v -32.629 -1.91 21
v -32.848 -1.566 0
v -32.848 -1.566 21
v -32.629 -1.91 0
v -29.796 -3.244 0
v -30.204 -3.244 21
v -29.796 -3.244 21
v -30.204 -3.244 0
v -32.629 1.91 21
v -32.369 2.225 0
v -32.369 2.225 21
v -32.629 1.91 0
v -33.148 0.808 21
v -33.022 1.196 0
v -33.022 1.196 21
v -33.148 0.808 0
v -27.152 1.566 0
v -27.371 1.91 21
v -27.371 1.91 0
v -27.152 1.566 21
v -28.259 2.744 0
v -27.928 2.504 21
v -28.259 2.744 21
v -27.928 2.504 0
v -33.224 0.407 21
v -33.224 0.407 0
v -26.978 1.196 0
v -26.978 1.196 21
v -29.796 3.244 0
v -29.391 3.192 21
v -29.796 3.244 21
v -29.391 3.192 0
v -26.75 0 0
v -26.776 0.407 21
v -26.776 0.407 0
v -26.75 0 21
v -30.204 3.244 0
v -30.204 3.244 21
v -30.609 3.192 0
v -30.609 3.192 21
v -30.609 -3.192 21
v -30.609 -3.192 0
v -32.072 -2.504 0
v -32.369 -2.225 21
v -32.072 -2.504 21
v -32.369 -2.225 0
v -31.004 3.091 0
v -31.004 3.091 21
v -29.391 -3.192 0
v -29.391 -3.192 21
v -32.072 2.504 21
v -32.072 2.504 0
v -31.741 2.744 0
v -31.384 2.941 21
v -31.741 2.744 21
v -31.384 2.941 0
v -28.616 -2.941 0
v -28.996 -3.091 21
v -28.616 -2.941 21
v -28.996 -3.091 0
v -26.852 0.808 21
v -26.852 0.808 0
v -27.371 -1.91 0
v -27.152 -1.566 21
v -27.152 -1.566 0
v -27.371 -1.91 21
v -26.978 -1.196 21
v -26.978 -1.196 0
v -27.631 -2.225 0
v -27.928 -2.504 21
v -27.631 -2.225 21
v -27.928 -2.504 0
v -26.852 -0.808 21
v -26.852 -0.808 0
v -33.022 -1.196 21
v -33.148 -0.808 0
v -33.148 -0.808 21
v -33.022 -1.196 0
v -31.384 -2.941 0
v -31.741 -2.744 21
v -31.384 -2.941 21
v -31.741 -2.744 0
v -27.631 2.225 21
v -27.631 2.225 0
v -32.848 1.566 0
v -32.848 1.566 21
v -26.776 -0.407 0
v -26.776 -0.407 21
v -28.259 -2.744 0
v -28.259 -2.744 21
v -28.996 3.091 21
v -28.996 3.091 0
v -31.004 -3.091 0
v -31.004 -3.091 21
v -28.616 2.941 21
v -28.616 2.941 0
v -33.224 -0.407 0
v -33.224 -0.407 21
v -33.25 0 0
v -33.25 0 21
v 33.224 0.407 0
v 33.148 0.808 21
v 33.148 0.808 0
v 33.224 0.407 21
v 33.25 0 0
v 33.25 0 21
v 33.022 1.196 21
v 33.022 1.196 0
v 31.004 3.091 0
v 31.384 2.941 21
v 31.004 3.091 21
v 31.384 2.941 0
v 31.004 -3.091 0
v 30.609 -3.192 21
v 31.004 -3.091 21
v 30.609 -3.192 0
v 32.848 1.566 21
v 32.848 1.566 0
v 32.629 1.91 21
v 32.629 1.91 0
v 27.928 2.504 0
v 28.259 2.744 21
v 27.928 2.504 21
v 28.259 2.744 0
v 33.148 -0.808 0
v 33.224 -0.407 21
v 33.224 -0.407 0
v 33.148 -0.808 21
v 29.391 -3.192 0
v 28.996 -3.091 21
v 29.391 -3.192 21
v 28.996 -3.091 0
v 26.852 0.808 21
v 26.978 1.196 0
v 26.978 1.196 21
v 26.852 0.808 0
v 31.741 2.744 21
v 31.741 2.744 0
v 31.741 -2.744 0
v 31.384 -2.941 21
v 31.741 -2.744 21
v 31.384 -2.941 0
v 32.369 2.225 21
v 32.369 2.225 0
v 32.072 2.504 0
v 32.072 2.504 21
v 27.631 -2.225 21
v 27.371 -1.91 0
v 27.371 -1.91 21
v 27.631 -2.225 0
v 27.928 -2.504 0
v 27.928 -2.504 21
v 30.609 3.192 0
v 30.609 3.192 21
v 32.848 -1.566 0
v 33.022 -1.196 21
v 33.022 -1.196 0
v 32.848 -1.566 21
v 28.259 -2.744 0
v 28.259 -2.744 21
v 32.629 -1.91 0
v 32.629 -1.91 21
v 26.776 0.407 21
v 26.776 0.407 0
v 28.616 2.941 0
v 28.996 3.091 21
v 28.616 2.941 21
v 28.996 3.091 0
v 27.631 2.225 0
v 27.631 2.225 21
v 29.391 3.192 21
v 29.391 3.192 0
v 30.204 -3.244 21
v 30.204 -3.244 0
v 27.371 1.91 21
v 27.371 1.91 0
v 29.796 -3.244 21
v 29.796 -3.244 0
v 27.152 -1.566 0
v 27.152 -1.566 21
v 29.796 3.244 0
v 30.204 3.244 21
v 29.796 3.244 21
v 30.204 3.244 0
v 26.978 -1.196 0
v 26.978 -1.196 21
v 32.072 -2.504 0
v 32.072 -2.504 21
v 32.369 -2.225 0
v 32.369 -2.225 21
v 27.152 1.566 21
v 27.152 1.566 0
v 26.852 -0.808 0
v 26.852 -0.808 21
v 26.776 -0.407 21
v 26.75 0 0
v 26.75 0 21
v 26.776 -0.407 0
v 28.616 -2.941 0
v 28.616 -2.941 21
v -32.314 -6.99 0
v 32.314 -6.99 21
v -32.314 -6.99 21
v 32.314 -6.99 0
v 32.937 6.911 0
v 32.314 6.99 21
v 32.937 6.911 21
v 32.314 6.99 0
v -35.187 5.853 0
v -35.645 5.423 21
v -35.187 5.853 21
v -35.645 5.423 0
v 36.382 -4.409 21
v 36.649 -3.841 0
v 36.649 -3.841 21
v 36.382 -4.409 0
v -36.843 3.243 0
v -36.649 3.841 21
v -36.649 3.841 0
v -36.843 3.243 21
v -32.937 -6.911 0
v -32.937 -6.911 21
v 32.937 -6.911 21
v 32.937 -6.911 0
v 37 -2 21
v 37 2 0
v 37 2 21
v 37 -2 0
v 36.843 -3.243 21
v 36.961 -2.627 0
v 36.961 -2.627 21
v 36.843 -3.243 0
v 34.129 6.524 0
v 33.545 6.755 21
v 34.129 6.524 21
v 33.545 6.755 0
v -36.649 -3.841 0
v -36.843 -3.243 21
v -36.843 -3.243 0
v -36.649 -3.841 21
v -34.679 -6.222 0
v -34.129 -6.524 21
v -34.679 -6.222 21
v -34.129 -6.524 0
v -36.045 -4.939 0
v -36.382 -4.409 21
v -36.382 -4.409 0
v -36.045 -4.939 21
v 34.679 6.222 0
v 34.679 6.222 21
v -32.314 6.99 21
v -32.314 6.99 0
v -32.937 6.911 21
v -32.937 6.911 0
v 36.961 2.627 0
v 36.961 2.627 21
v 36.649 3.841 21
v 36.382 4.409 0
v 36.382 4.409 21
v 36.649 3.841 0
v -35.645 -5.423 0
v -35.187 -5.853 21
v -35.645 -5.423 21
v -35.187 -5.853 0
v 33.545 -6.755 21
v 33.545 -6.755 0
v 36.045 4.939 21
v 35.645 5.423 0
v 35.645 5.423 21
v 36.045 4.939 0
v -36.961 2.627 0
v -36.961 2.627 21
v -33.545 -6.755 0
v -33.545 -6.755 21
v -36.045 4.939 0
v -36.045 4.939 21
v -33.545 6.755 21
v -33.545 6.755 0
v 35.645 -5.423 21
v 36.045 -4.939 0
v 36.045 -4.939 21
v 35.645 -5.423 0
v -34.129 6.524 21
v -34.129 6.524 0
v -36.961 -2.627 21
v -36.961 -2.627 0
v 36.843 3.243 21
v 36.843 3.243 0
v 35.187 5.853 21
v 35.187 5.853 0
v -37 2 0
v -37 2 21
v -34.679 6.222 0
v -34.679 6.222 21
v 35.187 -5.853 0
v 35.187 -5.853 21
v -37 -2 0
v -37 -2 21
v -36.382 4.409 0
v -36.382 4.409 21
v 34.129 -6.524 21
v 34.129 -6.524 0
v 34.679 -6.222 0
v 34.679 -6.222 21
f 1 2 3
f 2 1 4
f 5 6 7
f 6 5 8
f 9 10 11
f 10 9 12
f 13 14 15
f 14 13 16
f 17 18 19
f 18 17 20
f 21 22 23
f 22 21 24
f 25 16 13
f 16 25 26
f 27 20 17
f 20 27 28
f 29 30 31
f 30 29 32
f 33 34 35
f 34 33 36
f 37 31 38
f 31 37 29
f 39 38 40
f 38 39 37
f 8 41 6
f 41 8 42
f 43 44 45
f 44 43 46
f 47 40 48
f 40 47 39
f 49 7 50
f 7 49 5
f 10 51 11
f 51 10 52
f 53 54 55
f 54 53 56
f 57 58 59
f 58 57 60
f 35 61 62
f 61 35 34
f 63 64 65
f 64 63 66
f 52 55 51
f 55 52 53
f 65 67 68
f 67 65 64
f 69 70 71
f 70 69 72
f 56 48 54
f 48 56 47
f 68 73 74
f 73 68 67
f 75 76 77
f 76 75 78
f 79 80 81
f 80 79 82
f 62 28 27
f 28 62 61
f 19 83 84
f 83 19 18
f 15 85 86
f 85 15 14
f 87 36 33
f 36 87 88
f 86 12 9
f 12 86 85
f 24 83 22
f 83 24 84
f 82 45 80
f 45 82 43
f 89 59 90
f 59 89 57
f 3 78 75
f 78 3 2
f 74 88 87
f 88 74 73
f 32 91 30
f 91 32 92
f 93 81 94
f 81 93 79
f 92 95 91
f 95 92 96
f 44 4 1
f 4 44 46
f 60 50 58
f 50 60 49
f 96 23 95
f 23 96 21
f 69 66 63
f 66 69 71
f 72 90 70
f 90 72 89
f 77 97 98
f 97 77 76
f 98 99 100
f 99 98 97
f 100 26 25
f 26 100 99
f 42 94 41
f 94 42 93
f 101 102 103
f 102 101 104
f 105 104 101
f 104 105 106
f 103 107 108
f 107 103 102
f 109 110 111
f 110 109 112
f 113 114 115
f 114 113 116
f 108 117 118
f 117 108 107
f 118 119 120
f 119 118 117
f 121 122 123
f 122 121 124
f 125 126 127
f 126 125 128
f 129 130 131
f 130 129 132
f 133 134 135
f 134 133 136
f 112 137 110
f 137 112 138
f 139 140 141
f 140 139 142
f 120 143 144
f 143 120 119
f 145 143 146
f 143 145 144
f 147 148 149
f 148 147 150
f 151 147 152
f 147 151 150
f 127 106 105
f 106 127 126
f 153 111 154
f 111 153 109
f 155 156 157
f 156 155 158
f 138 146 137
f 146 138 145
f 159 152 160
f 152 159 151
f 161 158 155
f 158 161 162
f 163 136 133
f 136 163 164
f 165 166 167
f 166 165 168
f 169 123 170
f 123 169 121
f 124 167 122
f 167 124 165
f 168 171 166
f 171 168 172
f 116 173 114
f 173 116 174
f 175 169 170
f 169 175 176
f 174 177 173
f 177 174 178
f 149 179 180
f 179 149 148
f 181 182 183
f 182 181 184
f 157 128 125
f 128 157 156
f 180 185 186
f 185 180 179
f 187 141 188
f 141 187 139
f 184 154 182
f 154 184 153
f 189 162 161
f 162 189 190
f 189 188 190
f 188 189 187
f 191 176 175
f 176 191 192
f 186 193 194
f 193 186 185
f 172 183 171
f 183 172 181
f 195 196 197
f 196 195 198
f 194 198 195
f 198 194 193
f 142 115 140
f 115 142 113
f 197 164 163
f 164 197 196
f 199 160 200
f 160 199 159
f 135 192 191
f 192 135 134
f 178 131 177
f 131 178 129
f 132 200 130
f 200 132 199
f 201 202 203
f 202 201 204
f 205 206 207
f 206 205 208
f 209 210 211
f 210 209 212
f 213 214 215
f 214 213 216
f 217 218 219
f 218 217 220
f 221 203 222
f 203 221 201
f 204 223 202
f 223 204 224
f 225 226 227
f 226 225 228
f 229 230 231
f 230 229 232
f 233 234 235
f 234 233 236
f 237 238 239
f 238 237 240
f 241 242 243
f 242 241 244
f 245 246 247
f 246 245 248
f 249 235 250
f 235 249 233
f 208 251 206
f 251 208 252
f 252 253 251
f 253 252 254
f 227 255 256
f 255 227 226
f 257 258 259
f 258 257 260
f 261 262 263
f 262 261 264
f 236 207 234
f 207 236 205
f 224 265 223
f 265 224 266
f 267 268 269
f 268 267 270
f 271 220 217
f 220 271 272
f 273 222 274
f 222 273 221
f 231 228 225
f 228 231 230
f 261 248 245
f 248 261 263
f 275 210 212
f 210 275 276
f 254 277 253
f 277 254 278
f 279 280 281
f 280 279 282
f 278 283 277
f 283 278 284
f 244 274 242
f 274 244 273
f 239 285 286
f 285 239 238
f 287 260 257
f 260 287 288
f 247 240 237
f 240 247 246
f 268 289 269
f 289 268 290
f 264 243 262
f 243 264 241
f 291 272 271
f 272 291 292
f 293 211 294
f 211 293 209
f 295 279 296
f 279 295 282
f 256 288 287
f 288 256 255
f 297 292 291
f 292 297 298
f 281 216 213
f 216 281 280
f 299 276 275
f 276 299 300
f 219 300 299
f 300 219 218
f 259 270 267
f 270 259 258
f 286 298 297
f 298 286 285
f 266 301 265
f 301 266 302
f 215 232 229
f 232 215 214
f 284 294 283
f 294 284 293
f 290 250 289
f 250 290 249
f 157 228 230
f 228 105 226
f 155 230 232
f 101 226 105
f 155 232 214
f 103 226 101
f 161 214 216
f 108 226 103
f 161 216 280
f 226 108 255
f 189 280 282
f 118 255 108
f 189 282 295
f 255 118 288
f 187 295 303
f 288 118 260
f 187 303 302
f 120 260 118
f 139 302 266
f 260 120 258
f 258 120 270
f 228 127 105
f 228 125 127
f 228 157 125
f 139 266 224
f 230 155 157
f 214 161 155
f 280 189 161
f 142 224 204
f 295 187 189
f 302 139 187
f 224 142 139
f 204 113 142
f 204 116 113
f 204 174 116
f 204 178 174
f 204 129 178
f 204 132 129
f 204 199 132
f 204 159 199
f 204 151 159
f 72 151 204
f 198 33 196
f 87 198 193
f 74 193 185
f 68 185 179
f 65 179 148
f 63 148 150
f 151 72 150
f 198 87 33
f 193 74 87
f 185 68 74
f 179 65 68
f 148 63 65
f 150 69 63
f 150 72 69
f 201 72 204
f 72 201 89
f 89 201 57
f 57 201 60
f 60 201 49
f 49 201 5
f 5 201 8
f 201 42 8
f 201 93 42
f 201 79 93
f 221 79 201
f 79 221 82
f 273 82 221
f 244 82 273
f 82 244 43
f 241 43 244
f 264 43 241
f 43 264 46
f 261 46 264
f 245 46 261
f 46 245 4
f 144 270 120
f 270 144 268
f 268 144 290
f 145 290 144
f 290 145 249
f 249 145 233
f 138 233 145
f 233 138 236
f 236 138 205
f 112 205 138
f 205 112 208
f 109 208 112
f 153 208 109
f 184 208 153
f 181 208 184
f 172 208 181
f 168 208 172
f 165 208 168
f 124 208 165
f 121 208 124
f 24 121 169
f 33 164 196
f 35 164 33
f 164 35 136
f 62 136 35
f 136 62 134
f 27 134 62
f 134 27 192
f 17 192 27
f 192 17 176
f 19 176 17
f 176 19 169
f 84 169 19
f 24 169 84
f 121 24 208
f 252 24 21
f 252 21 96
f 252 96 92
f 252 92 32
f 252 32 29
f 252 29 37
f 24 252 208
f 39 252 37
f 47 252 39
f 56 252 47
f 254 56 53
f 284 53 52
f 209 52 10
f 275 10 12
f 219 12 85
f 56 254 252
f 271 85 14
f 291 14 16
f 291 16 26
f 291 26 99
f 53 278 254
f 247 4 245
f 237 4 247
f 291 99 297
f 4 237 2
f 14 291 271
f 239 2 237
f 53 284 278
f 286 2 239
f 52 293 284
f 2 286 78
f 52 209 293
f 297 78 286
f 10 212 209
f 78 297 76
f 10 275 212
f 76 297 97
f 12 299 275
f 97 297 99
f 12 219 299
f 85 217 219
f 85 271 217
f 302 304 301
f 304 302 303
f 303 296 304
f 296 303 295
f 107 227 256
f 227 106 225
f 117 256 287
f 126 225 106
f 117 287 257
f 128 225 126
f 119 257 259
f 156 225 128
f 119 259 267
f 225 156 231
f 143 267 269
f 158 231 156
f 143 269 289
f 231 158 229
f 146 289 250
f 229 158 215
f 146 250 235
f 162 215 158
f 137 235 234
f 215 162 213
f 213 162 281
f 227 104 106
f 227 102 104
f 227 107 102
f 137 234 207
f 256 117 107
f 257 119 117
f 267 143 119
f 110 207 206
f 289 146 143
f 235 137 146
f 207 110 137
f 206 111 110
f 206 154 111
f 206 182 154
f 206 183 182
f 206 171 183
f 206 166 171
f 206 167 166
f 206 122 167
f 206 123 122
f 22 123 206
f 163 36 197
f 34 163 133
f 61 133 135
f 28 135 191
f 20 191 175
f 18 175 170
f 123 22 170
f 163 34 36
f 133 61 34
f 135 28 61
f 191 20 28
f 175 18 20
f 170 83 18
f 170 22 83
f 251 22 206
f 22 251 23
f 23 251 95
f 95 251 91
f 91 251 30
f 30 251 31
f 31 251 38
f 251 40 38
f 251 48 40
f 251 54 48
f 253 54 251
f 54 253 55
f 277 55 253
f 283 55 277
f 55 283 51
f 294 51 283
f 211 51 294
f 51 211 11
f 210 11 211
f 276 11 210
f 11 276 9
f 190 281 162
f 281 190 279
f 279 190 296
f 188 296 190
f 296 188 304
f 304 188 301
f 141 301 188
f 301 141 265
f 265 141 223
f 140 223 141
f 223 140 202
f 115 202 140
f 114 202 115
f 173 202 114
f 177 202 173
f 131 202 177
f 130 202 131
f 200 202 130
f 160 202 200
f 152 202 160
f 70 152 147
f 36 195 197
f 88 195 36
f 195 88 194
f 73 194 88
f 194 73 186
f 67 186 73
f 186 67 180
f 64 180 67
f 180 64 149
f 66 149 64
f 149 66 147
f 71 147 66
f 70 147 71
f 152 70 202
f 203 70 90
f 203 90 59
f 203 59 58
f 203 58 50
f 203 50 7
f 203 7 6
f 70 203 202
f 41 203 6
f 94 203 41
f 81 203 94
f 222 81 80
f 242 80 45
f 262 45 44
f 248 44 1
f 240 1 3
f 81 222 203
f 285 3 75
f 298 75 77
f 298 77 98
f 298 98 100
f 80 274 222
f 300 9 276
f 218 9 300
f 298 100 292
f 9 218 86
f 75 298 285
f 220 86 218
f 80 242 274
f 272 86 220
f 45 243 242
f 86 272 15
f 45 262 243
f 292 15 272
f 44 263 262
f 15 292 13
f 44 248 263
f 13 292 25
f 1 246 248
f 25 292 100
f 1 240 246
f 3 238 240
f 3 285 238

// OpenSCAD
$fn = 50;


difference() {
	union() {
		hull() {
			translate(v = [-32.0000000000, 2.0000000000, 0]) {
				cylinder(h = 21, r = 5);
			}
			translate(v = [32.0000000000, 2.0000000000, 0]) {
				cylinder(h = 21, r = 5);
			}
			translate(v = [-32.0000000000, -2.0000000000, 0]) {
				cylinder(h = 21, r = 5);
			}
			translate(v = [32.0000000000, -2.0000000000, 0]) {
				cylinder(h = 21, r = 5);
			}
		}
	}
	union() {
		translate(v = [-30.0000000000, 0.0000000000, -100.0000000000]) {
			cylinder(h = 200, r = 3.2500000000);
		}
		translate(v = [-30.0000000000, 0.0000000000, -100.0000000000]) {
			cylinder(h = 200, r = 3.2500000000);
		}
		translate(v = [30.0000000000, 0.0000000000, -100.0000000000]) {
			cylinder(h = 200, r = 3.2500000000);
		}
		translate(v = [30.0000000000, 0.0000000000, -100.0000000000]) {
			cylinder(h = 200, r = 3.2500000000);
		}
	}
}
